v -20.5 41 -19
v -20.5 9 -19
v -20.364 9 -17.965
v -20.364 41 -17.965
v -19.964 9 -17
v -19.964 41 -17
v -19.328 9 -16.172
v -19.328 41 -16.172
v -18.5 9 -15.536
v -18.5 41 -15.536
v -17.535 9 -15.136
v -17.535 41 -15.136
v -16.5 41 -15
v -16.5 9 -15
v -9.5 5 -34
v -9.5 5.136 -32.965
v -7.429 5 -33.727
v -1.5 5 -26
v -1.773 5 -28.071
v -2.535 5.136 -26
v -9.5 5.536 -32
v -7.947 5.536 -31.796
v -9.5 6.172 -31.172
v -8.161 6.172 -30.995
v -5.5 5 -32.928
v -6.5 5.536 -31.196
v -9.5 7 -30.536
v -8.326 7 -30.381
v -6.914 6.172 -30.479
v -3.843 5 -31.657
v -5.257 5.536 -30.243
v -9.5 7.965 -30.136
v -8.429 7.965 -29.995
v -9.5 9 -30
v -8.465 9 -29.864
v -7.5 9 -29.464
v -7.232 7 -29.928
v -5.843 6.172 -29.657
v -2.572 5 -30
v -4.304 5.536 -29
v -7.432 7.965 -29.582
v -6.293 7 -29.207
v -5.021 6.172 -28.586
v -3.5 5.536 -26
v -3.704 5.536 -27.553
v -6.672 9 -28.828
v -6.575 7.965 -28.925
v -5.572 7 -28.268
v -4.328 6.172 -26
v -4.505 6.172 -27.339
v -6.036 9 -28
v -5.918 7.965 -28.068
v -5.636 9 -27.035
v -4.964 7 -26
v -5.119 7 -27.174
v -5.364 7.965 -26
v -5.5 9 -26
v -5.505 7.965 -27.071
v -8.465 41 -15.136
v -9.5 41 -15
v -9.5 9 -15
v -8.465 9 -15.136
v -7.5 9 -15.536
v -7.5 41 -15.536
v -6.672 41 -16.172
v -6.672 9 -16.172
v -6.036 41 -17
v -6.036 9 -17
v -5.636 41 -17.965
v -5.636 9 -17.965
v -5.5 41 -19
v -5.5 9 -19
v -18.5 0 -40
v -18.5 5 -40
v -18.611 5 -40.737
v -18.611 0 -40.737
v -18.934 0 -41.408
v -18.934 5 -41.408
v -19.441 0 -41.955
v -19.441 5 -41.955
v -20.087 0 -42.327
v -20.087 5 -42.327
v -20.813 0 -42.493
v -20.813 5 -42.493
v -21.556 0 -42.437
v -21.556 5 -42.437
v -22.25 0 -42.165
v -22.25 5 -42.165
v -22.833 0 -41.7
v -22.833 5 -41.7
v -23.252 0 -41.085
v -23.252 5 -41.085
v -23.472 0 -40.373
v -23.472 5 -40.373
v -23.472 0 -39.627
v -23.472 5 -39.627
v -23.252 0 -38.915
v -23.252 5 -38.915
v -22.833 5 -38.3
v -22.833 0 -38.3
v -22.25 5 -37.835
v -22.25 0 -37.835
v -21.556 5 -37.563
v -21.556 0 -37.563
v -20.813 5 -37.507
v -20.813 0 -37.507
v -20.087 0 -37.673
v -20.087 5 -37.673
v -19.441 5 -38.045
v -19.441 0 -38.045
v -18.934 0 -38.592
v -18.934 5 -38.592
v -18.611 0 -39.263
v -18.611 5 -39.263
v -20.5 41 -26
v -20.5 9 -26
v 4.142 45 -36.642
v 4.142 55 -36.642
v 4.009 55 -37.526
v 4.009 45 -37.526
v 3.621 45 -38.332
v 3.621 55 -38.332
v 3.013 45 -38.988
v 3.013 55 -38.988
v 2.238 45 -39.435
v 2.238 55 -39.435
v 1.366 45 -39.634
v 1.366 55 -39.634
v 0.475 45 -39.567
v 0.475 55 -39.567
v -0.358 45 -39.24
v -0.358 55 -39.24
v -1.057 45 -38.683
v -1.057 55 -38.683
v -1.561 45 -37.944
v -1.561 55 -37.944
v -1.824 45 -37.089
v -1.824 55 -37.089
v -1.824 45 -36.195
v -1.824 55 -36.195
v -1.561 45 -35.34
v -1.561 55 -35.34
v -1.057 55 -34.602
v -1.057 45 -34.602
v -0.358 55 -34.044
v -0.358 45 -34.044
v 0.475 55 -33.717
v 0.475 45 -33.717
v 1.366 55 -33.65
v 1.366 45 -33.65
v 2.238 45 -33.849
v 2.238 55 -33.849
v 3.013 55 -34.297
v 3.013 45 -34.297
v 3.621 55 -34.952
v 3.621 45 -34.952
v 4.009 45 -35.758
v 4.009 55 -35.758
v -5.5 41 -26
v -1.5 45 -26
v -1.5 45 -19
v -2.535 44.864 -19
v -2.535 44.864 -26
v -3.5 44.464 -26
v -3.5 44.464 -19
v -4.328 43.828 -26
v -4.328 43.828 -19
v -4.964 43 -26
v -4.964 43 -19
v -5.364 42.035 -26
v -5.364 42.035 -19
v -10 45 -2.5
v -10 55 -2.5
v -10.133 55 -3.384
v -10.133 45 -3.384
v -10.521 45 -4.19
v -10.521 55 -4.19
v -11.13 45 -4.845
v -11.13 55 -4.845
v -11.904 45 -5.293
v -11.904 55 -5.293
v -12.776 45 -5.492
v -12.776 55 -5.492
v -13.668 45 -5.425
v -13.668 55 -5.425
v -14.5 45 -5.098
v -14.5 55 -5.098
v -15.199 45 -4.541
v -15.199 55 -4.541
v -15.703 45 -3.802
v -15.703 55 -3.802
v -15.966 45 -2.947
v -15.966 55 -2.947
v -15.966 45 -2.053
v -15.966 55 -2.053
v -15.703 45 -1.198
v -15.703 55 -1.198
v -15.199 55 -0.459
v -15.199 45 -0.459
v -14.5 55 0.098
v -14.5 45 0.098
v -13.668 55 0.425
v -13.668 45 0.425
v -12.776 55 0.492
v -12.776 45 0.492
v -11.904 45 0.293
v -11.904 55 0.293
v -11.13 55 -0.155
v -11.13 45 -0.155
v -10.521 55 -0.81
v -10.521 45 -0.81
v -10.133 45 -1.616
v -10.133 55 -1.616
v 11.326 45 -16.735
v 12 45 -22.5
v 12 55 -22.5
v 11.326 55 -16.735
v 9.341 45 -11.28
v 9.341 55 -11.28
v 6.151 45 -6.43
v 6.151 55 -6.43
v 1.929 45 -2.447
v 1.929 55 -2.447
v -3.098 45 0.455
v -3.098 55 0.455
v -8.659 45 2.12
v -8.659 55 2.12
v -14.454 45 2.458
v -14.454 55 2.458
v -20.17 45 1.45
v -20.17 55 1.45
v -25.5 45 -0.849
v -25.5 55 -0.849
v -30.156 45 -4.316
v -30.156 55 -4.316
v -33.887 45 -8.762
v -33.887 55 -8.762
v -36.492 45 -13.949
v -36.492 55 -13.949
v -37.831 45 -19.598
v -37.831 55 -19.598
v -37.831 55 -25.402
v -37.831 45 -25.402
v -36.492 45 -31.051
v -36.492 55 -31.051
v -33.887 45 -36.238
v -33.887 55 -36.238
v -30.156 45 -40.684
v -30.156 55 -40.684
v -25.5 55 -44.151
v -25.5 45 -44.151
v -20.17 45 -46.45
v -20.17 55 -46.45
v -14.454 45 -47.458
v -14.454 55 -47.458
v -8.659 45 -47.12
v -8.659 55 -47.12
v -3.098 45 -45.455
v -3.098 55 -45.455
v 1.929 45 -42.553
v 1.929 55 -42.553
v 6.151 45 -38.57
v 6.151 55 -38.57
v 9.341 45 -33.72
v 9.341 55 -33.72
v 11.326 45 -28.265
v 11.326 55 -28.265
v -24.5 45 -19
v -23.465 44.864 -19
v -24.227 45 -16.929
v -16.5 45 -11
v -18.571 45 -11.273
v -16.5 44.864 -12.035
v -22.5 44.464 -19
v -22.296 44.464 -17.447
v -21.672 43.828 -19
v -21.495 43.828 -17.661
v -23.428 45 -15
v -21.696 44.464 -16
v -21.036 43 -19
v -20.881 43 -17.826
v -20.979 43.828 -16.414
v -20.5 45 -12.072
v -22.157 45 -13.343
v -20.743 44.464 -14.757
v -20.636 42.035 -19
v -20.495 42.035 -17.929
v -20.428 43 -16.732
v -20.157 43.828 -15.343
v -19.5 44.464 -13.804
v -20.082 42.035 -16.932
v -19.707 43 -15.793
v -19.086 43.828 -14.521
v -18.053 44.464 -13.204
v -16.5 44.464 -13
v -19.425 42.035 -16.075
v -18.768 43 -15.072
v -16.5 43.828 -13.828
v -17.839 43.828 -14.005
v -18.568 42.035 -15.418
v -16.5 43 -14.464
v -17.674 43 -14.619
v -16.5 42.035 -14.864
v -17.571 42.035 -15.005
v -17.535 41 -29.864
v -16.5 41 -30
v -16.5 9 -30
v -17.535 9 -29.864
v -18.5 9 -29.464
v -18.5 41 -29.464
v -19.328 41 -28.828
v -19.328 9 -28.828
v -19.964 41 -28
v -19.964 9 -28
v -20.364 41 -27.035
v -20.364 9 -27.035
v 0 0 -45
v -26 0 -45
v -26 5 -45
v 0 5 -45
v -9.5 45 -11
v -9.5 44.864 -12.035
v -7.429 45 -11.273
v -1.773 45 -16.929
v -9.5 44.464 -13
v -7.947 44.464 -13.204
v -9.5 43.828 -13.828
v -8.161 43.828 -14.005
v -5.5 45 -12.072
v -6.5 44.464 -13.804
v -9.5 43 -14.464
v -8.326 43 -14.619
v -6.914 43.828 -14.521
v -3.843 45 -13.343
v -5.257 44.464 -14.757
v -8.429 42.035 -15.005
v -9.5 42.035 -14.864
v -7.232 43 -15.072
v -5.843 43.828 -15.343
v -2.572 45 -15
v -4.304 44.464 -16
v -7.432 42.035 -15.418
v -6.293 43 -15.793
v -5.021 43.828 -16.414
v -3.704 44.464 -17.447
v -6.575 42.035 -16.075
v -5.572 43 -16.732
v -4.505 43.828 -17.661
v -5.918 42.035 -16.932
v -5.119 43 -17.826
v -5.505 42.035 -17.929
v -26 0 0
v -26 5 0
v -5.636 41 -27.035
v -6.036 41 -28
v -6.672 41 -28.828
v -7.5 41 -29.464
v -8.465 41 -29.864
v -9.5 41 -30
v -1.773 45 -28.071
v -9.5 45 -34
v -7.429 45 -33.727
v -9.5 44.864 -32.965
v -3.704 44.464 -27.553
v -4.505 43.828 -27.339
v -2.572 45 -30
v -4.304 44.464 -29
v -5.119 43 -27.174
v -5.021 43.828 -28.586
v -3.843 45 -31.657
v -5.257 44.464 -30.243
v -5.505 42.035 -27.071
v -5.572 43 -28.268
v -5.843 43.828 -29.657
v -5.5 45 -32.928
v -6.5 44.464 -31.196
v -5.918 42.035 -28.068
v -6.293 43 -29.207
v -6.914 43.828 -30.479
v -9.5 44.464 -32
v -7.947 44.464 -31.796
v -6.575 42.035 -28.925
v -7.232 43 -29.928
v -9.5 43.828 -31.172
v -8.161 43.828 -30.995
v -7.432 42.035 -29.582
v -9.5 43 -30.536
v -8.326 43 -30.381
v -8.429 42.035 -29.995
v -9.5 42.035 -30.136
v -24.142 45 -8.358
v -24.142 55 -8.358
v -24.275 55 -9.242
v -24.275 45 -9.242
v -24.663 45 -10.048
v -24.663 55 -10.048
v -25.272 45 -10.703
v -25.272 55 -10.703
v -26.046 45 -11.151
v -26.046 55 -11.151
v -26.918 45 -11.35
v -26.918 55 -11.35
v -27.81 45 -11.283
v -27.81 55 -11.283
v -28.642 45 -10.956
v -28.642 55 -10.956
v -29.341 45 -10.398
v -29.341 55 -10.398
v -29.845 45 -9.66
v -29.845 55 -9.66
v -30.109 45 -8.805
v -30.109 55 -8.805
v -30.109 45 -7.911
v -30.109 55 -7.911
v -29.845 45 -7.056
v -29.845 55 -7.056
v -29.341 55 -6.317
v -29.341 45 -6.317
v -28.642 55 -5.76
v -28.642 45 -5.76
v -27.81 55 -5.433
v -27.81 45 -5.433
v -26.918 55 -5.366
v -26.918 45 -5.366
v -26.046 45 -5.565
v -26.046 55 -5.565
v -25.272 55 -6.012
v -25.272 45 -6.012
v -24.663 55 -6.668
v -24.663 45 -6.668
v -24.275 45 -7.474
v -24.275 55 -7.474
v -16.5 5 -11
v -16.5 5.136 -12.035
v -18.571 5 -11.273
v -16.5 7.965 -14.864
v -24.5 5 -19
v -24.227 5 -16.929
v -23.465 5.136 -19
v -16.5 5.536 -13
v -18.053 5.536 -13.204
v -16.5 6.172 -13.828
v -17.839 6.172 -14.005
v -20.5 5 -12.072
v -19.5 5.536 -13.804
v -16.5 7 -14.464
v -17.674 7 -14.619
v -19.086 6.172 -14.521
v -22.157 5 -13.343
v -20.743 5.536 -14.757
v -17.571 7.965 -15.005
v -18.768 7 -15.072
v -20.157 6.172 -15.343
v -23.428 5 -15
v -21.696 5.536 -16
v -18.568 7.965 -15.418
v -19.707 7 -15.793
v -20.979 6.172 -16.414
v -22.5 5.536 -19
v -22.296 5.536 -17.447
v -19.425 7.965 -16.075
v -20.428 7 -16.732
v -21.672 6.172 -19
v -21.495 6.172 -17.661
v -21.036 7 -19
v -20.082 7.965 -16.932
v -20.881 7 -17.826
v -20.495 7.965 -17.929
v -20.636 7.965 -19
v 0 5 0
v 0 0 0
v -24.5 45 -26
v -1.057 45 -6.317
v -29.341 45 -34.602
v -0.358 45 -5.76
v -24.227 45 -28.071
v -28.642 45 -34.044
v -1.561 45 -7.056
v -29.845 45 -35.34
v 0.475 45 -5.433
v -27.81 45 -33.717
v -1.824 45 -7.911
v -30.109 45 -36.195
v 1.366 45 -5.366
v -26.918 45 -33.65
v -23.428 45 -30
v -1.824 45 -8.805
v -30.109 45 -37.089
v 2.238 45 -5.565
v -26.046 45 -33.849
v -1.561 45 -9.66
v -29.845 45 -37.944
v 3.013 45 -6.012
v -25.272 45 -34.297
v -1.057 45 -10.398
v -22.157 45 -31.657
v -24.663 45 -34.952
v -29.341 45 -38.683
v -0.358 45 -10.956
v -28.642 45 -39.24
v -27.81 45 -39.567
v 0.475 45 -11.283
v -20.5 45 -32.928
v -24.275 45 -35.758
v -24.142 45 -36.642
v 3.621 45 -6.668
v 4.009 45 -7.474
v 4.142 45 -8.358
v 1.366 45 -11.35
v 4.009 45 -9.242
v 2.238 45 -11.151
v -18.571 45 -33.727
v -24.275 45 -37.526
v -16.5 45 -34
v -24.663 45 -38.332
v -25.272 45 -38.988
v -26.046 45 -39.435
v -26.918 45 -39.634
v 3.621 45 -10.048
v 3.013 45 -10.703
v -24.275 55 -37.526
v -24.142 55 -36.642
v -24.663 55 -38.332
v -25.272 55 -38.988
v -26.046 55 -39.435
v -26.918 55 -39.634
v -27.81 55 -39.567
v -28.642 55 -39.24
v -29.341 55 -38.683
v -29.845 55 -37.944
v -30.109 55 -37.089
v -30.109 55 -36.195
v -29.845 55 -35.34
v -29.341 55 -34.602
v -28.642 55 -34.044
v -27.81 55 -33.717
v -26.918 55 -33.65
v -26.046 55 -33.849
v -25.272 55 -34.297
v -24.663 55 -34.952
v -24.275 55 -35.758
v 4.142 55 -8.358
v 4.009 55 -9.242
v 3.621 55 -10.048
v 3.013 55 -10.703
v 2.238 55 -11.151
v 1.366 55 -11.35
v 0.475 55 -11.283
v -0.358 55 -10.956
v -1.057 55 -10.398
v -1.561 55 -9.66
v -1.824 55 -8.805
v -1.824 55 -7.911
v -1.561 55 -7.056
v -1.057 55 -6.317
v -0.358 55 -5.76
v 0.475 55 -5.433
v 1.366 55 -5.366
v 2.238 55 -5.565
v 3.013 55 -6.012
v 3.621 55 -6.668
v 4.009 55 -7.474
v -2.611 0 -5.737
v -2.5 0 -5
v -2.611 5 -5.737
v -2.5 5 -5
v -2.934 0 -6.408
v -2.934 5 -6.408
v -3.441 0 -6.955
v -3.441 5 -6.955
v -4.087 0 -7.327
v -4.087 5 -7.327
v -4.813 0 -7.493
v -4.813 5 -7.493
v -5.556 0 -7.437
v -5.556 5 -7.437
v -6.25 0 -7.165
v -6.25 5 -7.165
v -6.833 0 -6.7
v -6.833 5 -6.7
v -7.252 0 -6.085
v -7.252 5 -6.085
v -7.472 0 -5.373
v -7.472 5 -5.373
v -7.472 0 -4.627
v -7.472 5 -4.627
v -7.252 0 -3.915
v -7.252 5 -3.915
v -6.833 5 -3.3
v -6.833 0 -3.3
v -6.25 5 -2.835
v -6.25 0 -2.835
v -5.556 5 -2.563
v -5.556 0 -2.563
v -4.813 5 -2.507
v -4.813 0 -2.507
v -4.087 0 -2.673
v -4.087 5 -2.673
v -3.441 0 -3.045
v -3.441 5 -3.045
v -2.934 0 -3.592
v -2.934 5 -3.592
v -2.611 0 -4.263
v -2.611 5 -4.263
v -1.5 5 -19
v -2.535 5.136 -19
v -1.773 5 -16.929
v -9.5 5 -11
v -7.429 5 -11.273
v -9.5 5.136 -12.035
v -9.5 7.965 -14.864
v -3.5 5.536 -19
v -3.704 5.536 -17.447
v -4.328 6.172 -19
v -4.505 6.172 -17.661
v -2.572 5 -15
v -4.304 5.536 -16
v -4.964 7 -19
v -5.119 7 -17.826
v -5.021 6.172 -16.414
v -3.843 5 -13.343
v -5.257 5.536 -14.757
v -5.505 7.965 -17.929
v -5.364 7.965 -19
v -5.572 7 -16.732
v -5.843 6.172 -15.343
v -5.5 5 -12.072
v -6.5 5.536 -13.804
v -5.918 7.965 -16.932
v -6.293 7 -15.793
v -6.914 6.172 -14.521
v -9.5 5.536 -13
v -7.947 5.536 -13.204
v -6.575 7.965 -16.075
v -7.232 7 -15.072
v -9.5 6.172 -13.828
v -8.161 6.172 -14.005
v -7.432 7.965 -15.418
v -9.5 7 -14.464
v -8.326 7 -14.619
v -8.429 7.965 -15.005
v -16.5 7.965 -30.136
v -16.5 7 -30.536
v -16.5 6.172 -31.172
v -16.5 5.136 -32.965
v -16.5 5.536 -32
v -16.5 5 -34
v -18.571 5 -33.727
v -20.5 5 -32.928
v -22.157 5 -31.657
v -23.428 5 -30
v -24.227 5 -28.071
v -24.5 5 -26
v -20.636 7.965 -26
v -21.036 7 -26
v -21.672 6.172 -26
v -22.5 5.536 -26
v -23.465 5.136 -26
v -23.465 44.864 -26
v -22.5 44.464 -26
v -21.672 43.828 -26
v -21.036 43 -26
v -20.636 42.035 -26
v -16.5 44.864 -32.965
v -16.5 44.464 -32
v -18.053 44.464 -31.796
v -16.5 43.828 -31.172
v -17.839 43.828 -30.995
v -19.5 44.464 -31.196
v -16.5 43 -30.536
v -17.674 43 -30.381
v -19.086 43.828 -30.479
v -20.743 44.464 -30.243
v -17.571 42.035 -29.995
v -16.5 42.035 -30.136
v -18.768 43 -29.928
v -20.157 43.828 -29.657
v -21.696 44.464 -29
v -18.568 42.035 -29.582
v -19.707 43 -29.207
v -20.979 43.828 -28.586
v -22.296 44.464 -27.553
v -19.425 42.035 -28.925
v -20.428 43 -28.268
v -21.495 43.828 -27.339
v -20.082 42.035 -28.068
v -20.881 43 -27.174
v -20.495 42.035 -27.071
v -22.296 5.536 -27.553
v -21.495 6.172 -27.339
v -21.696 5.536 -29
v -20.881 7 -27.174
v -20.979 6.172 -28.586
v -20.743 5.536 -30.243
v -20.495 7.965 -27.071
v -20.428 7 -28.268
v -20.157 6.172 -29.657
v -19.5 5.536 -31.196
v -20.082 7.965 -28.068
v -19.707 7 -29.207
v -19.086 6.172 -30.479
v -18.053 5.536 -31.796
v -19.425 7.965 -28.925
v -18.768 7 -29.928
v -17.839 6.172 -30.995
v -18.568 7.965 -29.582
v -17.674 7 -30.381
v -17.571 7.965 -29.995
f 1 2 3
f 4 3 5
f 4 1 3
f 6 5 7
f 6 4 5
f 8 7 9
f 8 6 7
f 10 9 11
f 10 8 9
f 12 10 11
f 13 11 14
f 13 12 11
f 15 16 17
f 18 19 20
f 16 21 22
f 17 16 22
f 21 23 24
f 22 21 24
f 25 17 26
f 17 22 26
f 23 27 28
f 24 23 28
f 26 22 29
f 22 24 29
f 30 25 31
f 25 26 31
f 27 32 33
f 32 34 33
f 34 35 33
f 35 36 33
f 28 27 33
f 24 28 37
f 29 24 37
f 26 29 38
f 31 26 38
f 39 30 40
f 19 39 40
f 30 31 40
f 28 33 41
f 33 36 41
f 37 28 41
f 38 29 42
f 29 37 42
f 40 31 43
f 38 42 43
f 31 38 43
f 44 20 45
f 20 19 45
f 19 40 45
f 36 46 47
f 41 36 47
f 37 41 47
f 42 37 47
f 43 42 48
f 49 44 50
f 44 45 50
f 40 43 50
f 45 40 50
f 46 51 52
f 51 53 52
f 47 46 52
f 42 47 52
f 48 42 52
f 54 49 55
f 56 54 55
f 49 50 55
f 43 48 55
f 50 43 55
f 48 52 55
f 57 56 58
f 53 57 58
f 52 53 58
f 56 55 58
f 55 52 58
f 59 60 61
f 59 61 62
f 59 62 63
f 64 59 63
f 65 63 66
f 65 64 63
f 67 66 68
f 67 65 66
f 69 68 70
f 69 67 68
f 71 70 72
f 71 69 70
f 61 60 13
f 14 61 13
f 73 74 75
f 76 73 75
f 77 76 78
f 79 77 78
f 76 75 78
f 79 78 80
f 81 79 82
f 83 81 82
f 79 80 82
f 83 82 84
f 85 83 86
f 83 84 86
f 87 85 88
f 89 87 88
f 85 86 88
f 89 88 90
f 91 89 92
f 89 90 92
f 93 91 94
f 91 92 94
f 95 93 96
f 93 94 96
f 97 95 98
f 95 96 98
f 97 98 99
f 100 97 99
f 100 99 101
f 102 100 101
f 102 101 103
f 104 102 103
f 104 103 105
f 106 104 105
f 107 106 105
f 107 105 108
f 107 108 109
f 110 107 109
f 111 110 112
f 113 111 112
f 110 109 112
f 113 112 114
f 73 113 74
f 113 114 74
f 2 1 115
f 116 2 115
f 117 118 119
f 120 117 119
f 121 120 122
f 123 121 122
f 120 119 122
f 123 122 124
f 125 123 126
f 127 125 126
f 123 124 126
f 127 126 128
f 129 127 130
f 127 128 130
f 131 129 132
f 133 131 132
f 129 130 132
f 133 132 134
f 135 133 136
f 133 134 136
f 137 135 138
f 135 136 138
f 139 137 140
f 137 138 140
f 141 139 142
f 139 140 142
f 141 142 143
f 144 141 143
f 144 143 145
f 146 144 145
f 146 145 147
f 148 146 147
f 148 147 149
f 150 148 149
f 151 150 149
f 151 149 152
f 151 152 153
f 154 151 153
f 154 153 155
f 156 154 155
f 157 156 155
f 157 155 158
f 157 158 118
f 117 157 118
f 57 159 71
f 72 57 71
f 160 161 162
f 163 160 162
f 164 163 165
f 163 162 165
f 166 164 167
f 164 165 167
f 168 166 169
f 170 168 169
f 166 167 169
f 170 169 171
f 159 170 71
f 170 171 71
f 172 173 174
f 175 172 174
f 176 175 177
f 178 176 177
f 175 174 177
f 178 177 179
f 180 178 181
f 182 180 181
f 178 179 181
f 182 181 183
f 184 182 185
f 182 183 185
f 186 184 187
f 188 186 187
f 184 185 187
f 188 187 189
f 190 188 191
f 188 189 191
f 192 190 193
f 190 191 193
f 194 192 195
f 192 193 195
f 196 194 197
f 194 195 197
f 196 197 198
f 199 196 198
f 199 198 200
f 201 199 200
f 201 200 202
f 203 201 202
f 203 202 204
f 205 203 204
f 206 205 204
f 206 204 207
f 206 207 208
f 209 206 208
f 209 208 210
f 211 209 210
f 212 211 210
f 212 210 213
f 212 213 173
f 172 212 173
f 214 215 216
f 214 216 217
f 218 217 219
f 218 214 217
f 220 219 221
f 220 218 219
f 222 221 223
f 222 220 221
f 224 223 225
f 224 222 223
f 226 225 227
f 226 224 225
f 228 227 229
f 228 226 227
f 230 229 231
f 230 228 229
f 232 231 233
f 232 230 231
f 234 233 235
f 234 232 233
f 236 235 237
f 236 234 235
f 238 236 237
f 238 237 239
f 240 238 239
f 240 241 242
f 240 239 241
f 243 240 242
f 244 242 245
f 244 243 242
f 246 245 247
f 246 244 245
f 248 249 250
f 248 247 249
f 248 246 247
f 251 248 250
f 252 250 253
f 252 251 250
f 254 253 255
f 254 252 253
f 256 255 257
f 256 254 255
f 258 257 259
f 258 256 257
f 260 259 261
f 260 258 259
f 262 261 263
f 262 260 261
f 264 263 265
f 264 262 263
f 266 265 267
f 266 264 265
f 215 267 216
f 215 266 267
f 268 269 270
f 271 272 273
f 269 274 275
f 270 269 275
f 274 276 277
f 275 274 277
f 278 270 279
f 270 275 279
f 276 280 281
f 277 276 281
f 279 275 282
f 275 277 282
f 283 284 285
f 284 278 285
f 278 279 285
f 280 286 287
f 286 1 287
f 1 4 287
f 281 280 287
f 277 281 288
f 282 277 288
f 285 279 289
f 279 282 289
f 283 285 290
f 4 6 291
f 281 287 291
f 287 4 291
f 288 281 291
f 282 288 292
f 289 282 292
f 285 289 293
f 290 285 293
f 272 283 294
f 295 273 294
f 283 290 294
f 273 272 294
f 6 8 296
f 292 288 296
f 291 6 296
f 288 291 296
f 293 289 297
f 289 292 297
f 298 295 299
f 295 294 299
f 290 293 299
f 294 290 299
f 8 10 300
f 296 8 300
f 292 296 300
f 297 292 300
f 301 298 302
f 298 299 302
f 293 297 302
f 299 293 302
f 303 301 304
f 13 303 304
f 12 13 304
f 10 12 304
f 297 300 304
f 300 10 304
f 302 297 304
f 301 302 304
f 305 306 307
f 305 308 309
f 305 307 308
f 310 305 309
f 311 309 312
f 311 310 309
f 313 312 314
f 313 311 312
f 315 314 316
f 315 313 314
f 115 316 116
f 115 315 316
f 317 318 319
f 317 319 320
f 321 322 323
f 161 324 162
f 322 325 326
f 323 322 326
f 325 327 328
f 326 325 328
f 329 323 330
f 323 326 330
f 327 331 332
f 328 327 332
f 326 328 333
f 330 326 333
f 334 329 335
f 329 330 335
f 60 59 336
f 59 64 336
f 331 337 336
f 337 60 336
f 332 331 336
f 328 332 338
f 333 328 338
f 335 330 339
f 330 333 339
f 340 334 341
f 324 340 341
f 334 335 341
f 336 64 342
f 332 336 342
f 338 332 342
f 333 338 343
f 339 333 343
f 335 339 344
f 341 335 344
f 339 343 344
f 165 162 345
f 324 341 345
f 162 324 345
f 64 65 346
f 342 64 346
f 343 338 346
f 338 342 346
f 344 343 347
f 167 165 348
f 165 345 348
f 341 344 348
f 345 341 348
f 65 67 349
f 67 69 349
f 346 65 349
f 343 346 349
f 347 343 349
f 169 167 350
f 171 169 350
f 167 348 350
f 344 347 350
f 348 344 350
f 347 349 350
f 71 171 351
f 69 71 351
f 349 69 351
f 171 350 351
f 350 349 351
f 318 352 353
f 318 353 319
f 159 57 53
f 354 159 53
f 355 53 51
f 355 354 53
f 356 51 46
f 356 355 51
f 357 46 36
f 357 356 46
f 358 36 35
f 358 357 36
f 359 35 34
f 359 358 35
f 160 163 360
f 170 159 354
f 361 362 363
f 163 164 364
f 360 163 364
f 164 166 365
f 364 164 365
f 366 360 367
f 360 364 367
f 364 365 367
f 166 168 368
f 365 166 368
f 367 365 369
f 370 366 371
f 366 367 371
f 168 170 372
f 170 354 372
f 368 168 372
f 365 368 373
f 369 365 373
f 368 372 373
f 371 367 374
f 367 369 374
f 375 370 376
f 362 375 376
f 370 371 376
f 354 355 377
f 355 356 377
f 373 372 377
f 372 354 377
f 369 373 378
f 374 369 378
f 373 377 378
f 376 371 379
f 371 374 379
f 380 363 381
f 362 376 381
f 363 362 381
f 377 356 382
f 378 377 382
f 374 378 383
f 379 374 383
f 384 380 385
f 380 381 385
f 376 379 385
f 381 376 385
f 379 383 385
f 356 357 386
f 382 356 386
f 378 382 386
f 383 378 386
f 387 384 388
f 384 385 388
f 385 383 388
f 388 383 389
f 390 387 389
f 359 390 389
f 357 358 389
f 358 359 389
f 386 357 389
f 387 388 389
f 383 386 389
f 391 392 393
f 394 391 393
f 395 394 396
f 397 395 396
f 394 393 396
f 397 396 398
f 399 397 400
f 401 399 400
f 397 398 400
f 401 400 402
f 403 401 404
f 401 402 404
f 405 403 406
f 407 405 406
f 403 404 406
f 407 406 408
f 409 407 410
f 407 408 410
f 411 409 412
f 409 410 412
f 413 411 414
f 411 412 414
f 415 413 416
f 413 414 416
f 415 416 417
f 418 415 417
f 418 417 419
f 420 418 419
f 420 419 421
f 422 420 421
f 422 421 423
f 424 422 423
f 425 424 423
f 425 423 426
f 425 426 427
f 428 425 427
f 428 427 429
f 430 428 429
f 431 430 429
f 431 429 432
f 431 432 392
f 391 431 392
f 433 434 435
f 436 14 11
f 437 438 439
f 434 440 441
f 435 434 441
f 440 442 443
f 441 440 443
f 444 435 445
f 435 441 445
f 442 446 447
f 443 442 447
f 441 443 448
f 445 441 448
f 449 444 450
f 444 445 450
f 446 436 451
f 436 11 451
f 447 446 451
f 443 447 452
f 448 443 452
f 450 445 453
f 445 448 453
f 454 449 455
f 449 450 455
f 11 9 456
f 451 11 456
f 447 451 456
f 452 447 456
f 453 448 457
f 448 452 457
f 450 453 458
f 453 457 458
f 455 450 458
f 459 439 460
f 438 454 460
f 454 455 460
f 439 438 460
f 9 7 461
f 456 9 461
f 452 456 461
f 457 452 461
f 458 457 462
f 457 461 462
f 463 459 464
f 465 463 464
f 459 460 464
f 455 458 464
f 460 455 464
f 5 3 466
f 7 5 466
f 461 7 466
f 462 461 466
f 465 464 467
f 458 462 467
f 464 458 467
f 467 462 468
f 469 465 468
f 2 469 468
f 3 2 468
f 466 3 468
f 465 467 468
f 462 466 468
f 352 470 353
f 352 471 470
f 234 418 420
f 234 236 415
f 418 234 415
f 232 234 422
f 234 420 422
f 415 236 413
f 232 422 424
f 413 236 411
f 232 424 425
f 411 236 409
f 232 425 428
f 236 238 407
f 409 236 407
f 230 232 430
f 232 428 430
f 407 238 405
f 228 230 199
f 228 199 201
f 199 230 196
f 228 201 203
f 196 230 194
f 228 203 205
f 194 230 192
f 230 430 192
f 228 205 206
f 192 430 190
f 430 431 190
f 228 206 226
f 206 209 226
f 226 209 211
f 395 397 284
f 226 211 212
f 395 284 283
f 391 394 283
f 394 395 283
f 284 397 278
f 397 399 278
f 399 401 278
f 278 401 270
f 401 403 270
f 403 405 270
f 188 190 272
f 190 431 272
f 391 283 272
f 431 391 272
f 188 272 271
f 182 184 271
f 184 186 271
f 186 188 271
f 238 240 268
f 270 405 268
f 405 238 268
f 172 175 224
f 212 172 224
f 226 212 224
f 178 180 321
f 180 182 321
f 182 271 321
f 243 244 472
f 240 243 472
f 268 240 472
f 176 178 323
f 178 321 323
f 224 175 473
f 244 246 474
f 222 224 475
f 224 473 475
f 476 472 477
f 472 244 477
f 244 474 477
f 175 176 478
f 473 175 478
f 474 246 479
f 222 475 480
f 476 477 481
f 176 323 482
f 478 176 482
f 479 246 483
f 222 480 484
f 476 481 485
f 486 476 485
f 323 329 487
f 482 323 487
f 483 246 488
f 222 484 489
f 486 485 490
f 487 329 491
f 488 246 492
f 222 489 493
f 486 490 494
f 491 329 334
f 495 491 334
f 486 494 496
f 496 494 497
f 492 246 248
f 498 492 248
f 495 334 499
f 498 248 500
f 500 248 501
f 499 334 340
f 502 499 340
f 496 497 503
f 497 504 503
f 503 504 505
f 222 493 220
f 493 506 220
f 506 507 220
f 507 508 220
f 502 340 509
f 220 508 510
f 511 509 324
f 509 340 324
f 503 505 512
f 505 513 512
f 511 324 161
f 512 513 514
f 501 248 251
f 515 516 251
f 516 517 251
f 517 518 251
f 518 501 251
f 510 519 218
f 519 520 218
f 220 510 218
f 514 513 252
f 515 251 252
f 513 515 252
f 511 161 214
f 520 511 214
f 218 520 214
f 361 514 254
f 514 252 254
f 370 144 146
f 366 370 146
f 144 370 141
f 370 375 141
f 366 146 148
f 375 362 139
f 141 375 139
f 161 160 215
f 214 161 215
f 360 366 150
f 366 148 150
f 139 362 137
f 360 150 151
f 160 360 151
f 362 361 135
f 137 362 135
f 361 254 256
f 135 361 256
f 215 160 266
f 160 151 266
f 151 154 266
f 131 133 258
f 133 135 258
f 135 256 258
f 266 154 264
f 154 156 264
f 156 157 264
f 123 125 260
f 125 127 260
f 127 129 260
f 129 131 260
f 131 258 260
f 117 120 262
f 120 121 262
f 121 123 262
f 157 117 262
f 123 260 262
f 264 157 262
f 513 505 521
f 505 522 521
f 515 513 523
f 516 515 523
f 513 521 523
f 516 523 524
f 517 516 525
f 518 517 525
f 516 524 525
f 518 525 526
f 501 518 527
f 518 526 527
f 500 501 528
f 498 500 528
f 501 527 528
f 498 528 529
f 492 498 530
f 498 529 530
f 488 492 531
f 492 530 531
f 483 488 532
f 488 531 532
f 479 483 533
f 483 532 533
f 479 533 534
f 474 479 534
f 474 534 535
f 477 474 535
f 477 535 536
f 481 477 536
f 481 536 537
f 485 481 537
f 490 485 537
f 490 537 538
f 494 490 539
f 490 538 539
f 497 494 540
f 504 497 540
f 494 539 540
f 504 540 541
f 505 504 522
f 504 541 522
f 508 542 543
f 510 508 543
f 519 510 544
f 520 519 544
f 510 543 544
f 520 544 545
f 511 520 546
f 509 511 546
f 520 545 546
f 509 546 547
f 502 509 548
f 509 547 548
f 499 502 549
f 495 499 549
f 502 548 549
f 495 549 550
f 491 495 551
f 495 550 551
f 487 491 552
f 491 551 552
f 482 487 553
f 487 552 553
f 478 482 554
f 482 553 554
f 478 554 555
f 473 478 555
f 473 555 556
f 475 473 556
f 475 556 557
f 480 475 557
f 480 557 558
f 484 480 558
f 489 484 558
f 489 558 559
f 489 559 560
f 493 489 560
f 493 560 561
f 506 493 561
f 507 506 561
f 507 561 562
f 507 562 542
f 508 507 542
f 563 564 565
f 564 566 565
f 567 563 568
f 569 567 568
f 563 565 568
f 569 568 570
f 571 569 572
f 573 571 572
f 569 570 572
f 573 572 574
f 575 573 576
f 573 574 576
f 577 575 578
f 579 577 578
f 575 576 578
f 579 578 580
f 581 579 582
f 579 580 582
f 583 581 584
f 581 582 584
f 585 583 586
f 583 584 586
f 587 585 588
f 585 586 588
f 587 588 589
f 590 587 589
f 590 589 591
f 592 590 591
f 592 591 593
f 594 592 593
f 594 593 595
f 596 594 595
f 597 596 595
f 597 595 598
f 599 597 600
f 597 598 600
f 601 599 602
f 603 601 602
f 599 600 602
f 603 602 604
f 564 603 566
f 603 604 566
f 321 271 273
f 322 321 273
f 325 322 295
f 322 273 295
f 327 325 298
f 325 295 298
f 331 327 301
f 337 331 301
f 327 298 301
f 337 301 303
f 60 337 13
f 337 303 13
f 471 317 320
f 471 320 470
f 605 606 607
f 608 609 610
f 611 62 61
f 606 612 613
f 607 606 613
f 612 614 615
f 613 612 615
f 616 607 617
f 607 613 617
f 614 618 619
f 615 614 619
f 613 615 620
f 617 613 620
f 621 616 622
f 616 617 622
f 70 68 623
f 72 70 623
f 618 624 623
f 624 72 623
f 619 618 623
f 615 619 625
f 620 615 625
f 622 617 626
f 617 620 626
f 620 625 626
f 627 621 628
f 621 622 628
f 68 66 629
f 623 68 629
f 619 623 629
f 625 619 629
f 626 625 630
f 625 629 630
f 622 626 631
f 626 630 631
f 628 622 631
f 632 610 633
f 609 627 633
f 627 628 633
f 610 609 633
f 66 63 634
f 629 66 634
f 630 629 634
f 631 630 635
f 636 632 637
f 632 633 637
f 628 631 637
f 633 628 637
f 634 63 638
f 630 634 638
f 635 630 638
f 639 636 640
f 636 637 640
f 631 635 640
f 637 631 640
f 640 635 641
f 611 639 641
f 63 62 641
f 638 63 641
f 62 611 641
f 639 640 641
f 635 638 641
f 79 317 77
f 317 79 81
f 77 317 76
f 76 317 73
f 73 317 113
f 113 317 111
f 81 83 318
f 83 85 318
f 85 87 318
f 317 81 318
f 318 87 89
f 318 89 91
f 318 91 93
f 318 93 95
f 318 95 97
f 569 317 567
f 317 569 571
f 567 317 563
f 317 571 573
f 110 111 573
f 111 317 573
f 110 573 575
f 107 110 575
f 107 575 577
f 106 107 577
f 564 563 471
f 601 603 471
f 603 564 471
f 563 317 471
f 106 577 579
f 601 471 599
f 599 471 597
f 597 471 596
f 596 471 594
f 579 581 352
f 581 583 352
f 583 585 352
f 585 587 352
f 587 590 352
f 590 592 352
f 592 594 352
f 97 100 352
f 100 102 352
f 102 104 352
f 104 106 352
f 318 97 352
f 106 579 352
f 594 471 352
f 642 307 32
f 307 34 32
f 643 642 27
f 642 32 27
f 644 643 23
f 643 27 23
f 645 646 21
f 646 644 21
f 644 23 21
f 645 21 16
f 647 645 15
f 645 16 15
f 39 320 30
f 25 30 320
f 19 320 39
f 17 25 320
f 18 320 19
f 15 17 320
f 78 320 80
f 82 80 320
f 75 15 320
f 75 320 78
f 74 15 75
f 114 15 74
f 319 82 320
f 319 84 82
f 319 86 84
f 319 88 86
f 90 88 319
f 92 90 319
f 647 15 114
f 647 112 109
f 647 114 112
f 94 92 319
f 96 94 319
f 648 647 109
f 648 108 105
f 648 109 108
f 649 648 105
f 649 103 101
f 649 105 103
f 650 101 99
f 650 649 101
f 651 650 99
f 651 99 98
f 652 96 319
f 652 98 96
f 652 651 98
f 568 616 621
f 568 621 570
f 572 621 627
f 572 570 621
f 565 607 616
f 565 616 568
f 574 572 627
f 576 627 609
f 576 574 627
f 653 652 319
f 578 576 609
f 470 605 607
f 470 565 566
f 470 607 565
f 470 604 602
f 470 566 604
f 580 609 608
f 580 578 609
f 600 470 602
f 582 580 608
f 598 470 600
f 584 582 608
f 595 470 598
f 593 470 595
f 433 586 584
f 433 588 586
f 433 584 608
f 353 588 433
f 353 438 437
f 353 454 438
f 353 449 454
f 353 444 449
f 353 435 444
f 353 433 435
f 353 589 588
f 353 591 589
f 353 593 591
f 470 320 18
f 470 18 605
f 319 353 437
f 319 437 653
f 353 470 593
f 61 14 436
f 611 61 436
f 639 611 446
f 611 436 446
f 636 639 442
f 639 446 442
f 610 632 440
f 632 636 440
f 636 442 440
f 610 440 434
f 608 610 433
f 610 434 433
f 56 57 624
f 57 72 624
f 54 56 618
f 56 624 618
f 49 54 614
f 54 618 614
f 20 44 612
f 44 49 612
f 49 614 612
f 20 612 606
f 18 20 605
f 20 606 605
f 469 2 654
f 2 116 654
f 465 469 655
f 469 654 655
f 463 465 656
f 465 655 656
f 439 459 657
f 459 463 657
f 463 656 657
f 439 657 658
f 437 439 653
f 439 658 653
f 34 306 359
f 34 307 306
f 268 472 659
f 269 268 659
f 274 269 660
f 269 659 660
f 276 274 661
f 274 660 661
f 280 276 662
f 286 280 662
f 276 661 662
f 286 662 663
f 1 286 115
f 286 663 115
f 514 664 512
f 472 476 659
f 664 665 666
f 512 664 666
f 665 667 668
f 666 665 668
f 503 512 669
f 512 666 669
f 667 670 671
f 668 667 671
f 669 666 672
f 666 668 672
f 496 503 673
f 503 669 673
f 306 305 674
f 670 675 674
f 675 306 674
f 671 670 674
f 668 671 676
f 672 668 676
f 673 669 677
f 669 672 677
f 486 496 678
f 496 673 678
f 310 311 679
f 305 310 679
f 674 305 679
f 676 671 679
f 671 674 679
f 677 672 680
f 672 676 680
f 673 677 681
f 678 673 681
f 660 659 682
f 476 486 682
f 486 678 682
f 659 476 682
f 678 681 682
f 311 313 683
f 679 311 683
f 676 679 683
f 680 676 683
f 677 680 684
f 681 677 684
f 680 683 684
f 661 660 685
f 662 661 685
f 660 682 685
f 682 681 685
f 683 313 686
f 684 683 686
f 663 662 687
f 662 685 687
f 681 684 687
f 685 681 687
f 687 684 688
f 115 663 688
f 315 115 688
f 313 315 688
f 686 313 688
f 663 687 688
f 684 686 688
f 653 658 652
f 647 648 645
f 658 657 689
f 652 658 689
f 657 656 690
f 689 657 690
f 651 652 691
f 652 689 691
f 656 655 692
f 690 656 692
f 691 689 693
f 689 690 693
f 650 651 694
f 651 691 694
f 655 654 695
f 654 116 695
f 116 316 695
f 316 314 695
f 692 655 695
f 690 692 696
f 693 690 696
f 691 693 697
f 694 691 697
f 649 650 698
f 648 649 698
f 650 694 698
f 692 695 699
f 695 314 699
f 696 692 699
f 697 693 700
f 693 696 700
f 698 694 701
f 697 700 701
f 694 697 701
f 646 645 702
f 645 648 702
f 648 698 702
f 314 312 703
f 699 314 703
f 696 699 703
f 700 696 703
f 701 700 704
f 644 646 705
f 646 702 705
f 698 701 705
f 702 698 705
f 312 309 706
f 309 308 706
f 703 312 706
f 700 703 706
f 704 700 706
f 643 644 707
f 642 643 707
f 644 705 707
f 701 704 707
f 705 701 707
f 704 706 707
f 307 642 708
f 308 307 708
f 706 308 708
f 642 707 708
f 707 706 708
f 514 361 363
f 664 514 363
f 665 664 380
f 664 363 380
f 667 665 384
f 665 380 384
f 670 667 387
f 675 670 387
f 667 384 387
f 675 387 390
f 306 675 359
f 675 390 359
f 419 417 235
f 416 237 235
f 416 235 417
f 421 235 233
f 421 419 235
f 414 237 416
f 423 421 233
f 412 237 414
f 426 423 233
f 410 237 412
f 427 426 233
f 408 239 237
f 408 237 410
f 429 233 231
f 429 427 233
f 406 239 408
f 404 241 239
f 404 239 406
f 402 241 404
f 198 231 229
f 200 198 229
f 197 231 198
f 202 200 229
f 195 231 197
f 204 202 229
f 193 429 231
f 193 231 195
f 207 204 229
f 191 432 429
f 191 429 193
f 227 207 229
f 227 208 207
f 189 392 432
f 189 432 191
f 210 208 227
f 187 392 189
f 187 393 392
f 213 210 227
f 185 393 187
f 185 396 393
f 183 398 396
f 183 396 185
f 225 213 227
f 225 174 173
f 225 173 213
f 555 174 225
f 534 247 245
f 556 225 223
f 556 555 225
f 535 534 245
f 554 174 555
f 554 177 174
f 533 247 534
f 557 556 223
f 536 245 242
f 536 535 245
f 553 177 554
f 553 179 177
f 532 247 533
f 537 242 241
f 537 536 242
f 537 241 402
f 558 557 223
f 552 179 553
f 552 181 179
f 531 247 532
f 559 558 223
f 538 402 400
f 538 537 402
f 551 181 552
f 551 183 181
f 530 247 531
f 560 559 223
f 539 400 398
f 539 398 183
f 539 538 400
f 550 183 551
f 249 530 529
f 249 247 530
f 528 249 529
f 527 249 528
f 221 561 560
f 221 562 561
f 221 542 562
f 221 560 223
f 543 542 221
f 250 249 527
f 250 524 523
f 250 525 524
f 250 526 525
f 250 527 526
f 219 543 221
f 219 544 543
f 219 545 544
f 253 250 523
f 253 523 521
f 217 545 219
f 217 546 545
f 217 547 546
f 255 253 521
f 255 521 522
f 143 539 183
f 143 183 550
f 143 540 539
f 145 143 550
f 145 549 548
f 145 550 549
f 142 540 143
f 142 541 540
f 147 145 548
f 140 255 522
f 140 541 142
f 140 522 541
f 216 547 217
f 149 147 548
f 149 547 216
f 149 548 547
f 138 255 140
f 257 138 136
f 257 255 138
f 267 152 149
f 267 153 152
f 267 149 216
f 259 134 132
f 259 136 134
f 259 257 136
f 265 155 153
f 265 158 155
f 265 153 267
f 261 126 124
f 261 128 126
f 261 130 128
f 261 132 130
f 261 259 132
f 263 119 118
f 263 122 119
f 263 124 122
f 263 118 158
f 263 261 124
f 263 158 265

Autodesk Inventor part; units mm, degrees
ref_plane "YZ Plane" through (0, 0, 0) normal (1, 0, 0) x (0, 1, 0)
ref_plane "XZ Plane" through (0, 0, 0) normal (0, 1, 0) x (-1, 0, 0)
ref_plane "XY Plane" through (0, 0, 0) normal (0, 0, 1) x (1, 0, 0)
sketch "Boceto1" plane through (0, 0, 0) normal (0, 1, 0) x (-1, 0, 0)
  line L0 (0, 0) -> (26, 0)
  line L1 (26, 0) -> (26, -45)
  line L2 (26, -45) -> (0, -45)
  line L3 (0, -45) -> (0, 0)
  dimension "d0" = 26
  dimension "d1" = 45
extrude "Extrusión1" add sketch "Boceto1" along normal blind 5
sketch "Boceto2" plane through (0, 5, 0) normal (0, 1, 0) x (1, 0, 0)
  line L0 (-26, 0) -> (0, 0) projected
  line L1 (0, 0) -> (-5, 0)
  line L2 (0, 45) -> (-26, 45) projected
  line L3 (-26, 45) -> (-21, 45)
  line L4 (0, 45) -> (0, 40)
  line L5 (0, 0) -> (0, 45) projected
  line L6 (0, 0) -> (0, 5)
  line L7 (-26, 45) -> (-26, 0) projected
  circle A0 centre (-21, 40) radius 2.5
  circle A1 centre (-5, 5) radius 2.5
  dimension "d4" = 5
  dimension "d6" = 5
  dimension "d7" = 5
  dimension "d9" = 5
  dimension "d10" = 5
extrude "Extrusión2" cut sketch "Boceto2" against normal blind 5 contours A0 | A1
sketch "Boceto3" plane through (0, 5, 0) normal (0, 1, 0) x (1, 0, 0)
  line L0 (0, 0) -> (0, 45) projected
  line L1 (0, 45) -> (0, 37.5)
  line L2 (0, 45) -> (0, 30)
  line L3 (0, 0) -> (0, 15)
  line L4 (-5.5, 15) -> (-20.5, 15)
  line L5 (-20.5, 15) -> (-20.5, 30)
  line L6 (-20.5, 30) -> (-5.5, 30)
  line L7 (-5.5, 30) -> (-5.5, 15)
extrude "Extrusión3" add sketch "Boceto3" along normal blind 40
sketch "Boceto4" plane through (0, 45, 0) normal (0, 1, 0) x (1, 0, 0)
  line L0 (-5.5, 30) -> (-20.5, 30) projected
  line L1 (-20.5, 30) -> (-20.5, 15) projected
  line L2 (-20.5, 30) -> (-20.5, 15)
  line L3 (-5.5, 15) -> (-5.5, 30) projected
  circle A0 centre (-13, 22.5) radius 25
  point P0 (0, 0)
extrude "Extrusión4" add sketch "Boceto4" along normal blind 10
fillet "Empalme1" radius 4 12 edges at (-13, 45, -30) (-5.5, 25, -30) (-5.5, 45, -22.5) (-5.5, 25, -15) (-20.5, 25, -30) (-20.5, 25, -15) (-13, 45, -15) (-20.5, 45, -22.5) (-20.5, 5, -22.5) (-13, 5, -15) (-13, 5, -30) (-5.5, 5, -22.5)
sketch "Boceto6" plane through (-13, 55, -22.5) normal (0, 1, 0) x (1, 0, 0)
  circle A0 centre (0, -20) radius 3
  line L0 (0, 0) -> (31.4027, 0) construction
  line L1 (0, 0) -> (28.2843, 0) construction
  circle A1 centre (14.1421, 14.1421) radius 3
  circle A2 centre (-14.1421, 14.1421) radius 3
  circle A3 centre (-14.1421, -14.1421) radius 3
  circle A4 centre (14.1421, -14.1421) radius 3
  point P0 (13, -22.5)
  dimension "d27" = 6
  dimension "d32" = 6
  dimension "d33" = 6
  dimension "d34" = 6
  dimension "d35" = 6
extrude "Extrusión5" cut sketch "Boceto6" against normal blind 10
properties part number "Flange"
